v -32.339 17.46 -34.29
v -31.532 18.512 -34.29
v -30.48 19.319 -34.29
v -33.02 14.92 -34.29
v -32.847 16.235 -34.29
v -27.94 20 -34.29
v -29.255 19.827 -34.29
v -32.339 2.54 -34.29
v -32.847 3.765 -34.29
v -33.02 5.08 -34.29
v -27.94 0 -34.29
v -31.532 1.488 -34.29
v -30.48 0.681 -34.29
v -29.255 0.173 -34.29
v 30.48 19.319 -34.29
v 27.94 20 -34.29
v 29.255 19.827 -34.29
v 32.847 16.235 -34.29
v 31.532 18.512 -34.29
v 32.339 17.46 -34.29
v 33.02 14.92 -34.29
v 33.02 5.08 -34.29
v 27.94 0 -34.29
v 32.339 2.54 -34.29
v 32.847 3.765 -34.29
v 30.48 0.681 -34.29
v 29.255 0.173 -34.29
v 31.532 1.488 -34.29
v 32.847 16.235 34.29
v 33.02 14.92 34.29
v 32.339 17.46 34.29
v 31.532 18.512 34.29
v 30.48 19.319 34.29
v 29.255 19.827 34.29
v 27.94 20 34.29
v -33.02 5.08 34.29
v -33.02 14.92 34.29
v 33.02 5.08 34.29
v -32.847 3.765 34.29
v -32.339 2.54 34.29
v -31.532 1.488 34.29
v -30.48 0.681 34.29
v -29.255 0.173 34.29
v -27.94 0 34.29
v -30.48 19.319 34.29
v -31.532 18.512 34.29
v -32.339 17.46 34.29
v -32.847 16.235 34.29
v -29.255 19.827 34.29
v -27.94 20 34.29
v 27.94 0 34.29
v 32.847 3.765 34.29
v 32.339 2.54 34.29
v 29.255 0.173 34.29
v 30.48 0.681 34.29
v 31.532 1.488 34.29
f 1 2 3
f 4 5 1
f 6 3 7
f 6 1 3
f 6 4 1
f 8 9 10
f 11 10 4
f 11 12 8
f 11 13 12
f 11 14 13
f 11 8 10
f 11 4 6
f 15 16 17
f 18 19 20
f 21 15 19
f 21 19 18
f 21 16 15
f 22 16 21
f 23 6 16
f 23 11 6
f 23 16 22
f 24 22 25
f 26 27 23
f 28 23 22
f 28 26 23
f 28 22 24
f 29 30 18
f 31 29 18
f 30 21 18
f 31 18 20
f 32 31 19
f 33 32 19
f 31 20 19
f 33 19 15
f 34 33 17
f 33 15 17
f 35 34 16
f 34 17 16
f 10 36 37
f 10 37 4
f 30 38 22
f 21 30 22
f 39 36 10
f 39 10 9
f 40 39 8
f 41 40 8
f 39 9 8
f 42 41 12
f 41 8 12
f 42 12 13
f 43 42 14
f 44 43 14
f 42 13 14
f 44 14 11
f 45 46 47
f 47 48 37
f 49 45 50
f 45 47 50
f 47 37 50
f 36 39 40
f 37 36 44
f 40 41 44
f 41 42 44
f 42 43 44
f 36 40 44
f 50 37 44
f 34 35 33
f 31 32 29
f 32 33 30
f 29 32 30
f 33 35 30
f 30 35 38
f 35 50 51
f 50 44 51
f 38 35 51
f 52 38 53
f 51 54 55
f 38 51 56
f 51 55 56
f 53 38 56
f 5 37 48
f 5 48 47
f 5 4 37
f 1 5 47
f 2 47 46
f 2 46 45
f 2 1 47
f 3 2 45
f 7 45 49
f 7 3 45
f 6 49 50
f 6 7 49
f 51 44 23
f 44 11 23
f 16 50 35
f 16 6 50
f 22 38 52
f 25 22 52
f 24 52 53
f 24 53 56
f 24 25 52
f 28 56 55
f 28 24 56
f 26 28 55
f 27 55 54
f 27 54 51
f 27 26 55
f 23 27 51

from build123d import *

# Parameters (mm, degrees)
SKETCH1_W      = 66.04
SKETCH1_H      = 68.58
EXTRUDE1_DEPTH = 20
FILLET1_R      = 5.08


with BuildPart() as part:
    # Sketch1 → Extrude1 (new body)
    with BuildSketch(Plane(origin=(0, 0, 0), x_dir=(1, 0, 0), z_dir=(0, 1, 0))):
        Rectangle(SKETCH1_W, SKETCH1_H)
    extrude(amount=EXTRUDE1_DEPTH)

    # Fillet1
    fillet1_edges = [part.edges().sort_by_distance(p)[0] for p in [
        (-33.02, 20, 0),
        (33.02, 20, 0),
        (-33.02, 0, 0),
        (33.02, 0, 0),
    ]]
    fillet(fillet1_edges, radius=FILLET1_R)


solid = part.part
